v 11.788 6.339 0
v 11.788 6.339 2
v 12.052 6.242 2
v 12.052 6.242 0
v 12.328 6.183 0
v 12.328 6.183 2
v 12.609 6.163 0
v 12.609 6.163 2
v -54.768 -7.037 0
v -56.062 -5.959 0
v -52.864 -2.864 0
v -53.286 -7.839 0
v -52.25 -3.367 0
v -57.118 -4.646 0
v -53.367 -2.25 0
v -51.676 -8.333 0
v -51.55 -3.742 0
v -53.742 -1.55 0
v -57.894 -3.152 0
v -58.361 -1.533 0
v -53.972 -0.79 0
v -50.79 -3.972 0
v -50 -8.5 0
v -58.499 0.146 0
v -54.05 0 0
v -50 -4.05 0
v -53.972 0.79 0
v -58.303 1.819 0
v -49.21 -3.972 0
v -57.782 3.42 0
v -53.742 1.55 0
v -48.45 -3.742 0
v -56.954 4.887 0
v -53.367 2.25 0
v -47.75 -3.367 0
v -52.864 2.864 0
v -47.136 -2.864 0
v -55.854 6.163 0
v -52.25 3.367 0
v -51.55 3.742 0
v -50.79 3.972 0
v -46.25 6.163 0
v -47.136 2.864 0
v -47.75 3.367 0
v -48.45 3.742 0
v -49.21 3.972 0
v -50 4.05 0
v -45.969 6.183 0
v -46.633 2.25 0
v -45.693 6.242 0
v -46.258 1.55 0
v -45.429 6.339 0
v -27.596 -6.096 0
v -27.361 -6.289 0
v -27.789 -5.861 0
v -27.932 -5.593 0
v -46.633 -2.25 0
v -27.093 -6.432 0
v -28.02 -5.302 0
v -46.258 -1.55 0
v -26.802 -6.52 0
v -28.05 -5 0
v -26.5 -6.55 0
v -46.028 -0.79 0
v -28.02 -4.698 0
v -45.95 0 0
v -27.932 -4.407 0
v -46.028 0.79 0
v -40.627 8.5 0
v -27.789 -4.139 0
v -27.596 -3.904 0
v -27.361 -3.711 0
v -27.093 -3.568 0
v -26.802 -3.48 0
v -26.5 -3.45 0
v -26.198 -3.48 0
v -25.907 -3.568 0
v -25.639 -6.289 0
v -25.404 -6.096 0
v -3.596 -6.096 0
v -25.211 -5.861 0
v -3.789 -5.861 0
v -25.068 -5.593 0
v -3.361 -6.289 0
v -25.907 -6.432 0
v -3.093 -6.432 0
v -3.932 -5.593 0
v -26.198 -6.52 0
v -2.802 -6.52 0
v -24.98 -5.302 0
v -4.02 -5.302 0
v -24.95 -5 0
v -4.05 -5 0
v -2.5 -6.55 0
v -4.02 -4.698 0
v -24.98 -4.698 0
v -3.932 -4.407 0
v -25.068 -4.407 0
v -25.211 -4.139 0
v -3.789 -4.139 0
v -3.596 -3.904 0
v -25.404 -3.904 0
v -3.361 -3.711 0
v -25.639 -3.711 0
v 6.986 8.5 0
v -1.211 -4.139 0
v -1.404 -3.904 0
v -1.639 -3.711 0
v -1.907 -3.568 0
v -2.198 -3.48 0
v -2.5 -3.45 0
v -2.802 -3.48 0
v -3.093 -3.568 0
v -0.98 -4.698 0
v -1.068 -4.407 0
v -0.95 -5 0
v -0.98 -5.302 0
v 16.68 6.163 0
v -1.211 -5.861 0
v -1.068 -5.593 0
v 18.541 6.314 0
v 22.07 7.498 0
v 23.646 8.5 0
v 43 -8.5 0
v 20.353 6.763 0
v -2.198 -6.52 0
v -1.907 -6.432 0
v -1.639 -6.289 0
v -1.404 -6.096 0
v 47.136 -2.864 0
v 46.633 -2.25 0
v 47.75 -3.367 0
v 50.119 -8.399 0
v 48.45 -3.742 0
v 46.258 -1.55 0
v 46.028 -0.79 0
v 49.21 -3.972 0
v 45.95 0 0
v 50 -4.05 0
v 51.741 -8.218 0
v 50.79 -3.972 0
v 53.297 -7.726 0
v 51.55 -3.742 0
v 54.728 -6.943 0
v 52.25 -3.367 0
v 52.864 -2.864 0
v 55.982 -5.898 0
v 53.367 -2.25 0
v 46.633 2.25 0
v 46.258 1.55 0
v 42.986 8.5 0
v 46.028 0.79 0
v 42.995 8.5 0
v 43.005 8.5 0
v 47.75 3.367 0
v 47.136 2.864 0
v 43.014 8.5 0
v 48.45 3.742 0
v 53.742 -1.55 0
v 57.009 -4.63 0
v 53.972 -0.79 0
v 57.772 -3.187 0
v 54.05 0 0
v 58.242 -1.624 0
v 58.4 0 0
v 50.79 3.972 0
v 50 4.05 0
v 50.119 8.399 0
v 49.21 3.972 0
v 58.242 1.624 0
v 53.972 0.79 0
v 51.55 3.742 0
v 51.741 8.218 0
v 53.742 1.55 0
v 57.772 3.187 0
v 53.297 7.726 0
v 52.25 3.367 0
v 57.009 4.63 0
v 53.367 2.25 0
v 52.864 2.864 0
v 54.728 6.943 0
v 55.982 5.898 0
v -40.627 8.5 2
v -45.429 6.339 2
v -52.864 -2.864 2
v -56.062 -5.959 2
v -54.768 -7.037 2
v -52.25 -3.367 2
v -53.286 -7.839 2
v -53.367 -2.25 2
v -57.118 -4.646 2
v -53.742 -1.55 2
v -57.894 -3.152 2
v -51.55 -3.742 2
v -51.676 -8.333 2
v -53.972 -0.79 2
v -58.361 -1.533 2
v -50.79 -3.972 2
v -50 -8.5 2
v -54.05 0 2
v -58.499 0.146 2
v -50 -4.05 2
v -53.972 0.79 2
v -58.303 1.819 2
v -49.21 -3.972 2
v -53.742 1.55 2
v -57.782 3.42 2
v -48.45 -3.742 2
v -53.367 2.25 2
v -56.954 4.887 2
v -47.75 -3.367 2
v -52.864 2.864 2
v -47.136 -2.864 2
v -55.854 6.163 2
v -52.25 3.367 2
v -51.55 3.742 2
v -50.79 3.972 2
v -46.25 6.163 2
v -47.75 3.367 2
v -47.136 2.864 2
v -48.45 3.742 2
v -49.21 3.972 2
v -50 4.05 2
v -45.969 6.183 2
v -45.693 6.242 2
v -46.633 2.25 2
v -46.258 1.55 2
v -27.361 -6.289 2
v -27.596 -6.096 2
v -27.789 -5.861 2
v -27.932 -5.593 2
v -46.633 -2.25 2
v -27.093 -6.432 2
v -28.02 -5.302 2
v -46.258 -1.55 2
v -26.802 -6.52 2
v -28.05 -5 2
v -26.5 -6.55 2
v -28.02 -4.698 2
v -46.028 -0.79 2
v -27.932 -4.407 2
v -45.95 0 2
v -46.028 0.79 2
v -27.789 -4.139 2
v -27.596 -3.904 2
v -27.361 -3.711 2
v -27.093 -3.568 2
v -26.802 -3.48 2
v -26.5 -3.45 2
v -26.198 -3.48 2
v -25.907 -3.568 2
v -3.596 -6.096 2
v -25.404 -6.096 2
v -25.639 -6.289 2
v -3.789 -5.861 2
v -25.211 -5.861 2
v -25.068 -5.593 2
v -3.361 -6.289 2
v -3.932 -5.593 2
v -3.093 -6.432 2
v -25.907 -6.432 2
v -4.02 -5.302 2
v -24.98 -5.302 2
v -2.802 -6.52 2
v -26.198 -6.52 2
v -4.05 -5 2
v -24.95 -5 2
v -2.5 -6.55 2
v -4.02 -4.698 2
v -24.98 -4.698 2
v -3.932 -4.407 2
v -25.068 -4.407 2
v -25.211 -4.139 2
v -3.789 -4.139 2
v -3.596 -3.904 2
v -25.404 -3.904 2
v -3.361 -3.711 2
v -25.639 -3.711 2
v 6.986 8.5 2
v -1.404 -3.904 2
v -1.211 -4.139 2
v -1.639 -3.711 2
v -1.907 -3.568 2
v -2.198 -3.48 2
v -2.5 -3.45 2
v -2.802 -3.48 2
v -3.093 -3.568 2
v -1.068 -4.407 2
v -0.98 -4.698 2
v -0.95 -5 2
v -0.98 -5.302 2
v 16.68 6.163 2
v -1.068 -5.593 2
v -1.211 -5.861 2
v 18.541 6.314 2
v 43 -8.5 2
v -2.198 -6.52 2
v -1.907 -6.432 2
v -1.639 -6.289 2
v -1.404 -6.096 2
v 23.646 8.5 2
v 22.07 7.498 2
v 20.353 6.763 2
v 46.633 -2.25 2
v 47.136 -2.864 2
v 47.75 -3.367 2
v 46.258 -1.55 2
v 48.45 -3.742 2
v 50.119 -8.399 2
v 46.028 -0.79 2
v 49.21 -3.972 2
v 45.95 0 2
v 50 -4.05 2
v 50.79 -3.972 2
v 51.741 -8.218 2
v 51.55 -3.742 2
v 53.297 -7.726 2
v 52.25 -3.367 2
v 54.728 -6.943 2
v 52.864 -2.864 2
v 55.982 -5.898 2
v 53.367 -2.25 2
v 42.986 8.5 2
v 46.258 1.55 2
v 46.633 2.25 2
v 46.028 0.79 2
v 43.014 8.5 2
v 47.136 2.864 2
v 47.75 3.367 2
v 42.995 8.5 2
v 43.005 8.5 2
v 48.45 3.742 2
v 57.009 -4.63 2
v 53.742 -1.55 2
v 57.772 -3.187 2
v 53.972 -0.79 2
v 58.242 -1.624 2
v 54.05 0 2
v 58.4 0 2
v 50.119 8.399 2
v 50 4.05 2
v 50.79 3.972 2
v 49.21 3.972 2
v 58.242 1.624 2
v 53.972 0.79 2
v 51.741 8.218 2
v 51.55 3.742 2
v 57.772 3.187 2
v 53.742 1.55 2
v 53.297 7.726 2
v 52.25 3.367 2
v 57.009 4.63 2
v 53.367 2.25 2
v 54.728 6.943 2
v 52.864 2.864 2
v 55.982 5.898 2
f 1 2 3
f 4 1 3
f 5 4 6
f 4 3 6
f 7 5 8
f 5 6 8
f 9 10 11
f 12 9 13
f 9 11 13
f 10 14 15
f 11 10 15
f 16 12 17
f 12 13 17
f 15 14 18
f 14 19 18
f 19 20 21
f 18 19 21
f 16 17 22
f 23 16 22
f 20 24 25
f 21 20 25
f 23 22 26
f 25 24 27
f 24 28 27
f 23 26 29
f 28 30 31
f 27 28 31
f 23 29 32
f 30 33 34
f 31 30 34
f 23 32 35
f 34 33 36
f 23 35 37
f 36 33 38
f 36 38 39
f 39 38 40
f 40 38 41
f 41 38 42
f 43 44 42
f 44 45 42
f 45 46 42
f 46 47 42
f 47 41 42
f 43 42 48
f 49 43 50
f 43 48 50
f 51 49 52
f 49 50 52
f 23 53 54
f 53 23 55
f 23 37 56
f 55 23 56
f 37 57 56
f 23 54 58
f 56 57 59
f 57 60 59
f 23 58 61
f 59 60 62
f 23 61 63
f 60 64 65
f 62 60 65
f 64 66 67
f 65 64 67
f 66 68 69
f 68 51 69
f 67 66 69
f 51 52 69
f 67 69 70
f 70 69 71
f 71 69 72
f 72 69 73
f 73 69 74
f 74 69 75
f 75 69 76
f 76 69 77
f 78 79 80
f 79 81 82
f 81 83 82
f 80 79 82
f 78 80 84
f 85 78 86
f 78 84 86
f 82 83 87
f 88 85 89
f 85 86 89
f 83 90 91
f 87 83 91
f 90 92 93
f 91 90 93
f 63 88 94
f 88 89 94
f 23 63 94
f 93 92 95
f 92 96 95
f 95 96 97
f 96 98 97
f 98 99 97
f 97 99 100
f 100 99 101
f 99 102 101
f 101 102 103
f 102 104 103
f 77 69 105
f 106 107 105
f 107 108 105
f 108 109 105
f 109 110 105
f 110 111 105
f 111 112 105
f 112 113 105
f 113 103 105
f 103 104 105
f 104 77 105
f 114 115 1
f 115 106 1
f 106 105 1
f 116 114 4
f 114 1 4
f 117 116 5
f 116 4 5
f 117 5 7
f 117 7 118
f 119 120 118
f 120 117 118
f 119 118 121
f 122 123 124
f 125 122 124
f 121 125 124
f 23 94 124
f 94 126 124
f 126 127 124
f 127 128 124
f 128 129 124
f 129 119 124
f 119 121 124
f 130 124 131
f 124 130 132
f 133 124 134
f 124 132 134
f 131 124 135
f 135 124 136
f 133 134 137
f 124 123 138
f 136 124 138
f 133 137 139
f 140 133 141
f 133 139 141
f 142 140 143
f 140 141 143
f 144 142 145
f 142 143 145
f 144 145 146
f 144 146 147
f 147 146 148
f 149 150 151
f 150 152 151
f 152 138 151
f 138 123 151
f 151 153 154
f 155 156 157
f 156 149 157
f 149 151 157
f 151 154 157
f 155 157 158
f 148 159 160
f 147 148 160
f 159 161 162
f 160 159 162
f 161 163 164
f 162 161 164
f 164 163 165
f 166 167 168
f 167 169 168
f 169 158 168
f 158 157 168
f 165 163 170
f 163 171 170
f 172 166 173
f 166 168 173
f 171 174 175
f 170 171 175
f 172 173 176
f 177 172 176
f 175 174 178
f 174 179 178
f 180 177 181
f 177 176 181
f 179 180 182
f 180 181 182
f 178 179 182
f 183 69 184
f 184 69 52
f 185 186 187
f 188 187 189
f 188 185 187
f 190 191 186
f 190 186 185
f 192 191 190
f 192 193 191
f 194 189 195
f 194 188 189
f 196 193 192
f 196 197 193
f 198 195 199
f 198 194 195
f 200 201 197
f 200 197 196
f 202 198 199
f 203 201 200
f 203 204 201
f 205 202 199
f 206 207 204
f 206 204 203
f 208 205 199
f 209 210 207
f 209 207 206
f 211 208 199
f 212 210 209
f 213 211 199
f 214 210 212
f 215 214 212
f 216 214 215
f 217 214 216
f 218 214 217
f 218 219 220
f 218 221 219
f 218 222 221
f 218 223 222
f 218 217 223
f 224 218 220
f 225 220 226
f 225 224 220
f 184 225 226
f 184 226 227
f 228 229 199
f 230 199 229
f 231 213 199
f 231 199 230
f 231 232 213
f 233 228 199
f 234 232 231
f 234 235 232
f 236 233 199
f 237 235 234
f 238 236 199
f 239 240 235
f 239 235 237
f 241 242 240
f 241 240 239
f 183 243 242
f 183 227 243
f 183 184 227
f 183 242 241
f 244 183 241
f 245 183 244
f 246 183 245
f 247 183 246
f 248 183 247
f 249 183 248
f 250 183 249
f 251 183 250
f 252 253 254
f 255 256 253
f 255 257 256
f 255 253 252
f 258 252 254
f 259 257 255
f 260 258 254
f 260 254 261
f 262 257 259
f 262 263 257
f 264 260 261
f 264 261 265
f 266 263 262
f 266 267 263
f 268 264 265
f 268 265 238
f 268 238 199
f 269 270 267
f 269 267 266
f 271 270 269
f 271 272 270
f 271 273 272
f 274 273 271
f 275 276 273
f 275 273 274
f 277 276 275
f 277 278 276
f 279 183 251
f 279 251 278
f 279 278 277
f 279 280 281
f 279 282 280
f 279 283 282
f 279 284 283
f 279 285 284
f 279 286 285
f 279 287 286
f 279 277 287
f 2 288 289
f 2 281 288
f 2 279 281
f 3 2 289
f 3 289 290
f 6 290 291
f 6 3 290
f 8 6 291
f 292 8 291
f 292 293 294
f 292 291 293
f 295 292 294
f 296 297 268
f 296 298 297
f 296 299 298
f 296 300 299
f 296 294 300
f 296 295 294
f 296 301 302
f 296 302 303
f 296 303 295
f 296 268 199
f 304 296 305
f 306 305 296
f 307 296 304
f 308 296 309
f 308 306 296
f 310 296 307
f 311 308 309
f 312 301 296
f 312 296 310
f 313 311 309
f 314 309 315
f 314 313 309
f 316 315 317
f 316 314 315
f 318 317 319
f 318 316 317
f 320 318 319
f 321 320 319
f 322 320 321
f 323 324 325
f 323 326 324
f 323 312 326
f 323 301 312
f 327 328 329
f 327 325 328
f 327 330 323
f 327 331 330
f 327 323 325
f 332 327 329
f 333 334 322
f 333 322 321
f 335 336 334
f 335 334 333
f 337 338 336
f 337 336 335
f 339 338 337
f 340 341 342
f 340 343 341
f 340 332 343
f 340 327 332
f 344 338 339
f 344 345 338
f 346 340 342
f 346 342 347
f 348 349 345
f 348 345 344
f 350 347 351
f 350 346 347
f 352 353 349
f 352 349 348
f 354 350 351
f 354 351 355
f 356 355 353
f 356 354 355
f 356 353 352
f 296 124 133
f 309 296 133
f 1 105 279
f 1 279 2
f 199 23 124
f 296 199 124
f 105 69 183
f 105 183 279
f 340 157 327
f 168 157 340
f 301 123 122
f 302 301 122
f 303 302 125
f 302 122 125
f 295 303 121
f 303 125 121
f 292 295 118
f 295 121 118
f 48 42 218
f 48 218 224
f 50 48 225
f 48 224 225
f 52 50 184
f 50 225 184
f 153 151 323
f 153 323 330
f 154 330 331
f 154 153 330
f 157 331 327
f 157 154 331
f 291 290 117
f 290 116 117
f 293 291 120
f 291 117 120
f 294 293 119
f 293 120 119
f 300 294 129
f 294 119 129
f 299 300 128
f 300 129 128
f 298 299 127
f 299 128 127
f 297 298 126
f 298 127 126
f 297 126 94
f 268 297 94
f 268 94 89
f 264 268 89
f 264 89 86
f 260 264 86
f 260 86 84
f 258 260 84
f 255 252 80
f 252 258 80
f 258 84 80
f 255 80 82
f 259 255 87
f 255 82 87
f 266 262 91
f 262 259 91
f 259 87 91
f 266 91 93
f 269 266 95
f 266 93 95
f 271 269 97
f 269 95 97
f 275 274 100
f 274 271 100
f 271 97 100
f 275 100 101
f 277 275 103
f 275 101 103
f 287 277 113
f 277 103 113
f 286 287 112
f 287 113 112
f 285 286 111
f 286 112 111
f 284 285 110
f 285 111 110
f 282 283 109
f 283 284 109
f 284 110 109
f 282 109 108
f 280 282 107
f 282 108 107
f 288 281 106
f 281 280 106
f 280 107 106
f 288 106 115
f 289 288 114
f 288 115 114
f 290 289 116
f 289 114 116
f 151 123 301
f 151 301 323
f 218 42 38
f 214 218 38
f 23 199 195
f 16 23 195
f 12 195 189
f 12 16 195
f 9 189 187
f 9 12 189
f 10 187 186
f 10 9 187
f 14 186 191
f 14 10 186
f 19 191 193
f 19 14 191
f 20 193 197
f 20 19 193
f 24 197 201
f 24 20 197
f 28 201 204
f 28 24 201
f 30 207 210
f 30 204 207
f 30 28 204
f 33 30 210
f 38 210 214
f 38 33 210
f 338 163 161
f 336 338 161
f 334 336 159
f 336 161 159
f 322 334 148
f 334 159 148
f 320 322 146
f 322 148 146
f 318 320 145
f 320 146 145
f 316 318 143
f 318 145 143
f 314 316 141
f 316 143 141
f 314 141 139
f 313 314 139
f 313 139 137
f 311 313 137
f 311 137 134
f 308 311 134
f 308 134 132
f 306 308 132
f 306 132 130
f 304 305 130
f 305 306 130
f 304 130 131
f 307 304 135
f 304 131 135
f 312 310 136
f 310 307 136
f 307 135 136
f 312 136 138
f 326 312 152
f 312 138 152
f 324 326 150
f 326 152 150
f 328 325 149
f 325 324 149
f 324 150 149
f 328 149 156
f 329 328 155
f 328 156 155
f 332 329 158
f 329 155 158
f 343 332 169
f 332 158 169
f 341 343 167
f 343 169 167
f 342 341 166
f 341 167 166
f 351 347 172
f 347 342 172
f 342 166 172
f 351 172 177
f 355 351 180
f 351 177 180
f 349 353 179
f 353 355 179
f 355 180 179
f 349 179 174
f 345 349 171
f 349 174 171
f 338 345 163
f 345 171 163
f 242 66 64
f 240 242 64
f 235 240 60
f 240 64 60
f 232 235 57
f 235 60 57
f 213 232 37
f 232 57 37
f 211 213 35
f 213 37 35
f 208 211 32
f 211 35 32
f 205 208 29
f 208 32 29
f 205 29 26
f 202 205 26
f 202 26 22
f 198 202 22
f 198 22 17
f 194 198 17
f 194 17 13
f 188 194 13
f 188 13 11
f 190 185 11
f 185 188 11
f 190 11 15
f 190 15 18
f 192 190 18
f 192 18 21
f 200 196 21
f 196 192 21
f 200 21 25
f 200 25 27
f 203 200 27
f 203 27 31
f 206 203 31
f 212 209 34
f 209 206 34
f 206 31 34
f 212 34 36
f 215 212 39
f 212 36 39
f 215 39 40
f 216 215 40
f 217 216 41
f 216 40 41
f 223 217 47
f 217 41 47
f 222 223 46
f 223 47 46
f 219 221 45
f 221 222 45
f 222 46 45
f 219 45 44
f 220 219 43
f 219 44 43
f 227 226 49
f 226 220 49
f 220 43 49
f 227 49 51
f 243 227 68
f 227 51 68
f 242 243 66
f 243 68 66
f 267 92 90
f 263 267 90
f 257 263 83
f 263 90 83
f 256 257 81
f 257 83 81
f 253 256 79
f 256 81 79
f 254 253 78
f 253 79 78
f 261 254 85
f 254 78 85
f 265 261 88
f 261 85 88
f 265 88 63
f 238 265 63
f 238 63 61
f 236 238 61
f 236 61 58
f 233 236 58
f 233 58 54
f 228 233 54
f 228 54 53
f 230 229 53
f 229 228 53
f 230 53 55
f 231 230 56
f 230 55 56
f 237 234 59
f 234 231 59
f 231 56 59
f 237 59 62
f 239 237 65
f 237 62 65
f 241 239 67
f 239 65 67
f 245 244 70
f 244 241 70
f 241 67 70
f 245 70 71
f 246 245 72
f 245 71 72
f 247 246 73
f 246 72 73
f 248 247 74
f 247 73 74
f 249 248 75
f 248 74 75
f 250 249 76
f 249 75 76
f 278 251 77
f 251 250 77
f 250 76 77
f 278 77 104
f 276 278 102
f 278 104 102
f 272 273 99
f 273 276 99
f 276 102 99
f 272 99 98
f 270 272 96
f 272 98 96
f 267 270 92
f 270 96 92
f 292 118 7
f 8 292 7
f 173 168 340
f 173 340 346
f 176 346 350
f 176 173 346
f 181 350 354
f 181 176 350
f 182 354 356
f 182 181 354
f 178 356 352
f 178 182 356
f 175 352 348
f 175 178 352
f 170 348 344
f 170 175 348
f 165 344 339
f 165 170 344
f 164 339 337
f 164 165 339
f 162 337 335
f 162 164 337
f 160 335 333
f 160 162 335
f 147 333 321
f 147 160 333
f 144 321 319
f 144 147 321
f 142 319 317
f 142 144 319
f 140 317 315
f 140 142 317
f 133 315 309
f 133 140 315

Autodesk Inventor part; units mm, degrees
ref_plane "YZ Plane" through (0, 0, 0) normal (1, 0, 0) x (0, 1, 0)
ref_plane "XZ Plane" through (0, 0, 0) normal (0, 1, 0) x (-1, 0, 0)
ref_plane "XY Plane" through (0, 0, 0) normal (0, 0, 1) x (1, 0, 0)
sketch "スケッチ1" plane through (0, 0, 0) normal (0, 0, 1) x (1, 0, 0)
  line L0 (-50, 0) -> (50, 0) construction
  circle A0 centre (-50, 0) radius 4.05
  circle A1 centre (50, 0) radius 4.05
  line L1 (-50, 8.5) -> (43, 8.5)
  line L2 (-50, -8.5) -> (43, -8.5)
  arc A2 (-50, 8.5) -> (-50, -8.5) centre (-50, 0) ccw
  line L3 (43, -8.5) -> (50.119, -8.3992)
  line L4 (43, 8.5) -> (50.119, 8.3992)
  arc A3 (50.119, -8.3992) -> (50.119, 8.3992) centre (50, 0) ccw
  line L5 (-29, -7.5) -> (0, -7.5) construction
  line L6 (0, -7.5) -> (0, -2.5) construction
  line L7 (0, -2.5) -> (-29, -2.5) construction
  line L8 (-29, -2.5) -> (-29, -7.5) construction
  line L9 (-29, -5) -> (0, -5) construction
  circle A4 centre (-26.5, -5) radius 1.55
  line L10 (-14.5, -5) -> (-14.5, -2.5) construction
  line L11 (52.3191, 13) -> (22.3191, 13)
  line L12 (22.3191, 13) -> (12.3191, 8.5)
  line L13 (52.3191, 13) -> (57.3191, 4.122)
  circle A5 centre (-2.5, -5) radius 1.55
  point P0 (0, 0)
  point P1 (0, 0)
  point P2 (54.8534, 8.5)
  dimension "d0" = 100
  dimension "d1" = 8.1
  dimension "d2" = 8.5
  dimension "d8" = 8.1
  dimension "d9" = 7
  dimension "d10" = 8.4
  dimension "d12" = 5
  dimension "d13" = 29
  dimension "d15" = 2.5
  dimension "d17" = 13
  dimension "d19" = 10
  dimension "d20" = 30
  dimension "d25" = 50
  dimension "d26" = 5
  dimension "d45" = 1
  dimension "d46" = 3.1
extrude "押し出し1" add sketch "スケッチ1" along normal blind 2 contours L1 L4 A3 L3 L2 A2
fillet "フィレット1" radius 2 1 edges at (43, 8.5, 1)
sketch "スケッチ2" plane through (0, 0, 0) normal (0, 0, -1) x (-1, 0, 0)
  circle A0 centre (-16.6795, 17.7128) radius 11.35 construction
  circle A1 centre (-16.6795, 17.7128) radius 11.55
  line L0 (-16.6795, 6.1628) -> (58.7547, 6.1628)
  line L1 (-16.6795, 17.7128) -> (-34, 27.7128) construction
  circle A2 centre (-50, 0) radius 4.05 projected
  line L2 (-50, 0) -> (-34, 27.7128) construction
  line L3 (50, -8.5) -> (-43, -8.5) projected
  line L4 (-2.1795, 10.6628) -> (35.8205, 10.6628)
  line L5 (35.8205, 10.6628) -> (45.8205, 6.1628)
  line L6 (-2.1795, 10.6628) -> (-12.1795, 6.1628)
  circle A3 centre (50, 0) radius 4.05 projected
  line L7 (58.7547, 6.1628) -> (-13.2236, 28.7337)
  arc A4 (50, -8.5) -> (50, 8.5) centre (50, 0) ccw projected
  point P0 (0, 0)
  dimension "d29" = 22.7
  dimension "d30" = 0.2
  dimension "d31" = 60
  dimension "d32" = 90
  dimension "d33" = 20
  dimension "d34" = 38
  dimension "d35" = 10
  dimension "d36" = 10
  dimension "d37" = 4.5
  dimension "d38" = 32
  dimension "d40" = 4.5
extrude "押し出し2" cut sketch "スケッチ2" against normal through all contours A1 | A1 L7 A4 L0 L5 L4 L6 | L7 L0 A4
fillet "フィレット2" radius 2 2 edges at (12.1795, 6.1628, 1) (-45.8205, 6.1628, 1)
equation "\"d8\" = d1"
equation "\"d19\" = d18"
equation "\"d36\" = d35"
equation "\"d18\" = 10"
properties part number "リンク_メインフレーム_6_1" material "GFRP"
